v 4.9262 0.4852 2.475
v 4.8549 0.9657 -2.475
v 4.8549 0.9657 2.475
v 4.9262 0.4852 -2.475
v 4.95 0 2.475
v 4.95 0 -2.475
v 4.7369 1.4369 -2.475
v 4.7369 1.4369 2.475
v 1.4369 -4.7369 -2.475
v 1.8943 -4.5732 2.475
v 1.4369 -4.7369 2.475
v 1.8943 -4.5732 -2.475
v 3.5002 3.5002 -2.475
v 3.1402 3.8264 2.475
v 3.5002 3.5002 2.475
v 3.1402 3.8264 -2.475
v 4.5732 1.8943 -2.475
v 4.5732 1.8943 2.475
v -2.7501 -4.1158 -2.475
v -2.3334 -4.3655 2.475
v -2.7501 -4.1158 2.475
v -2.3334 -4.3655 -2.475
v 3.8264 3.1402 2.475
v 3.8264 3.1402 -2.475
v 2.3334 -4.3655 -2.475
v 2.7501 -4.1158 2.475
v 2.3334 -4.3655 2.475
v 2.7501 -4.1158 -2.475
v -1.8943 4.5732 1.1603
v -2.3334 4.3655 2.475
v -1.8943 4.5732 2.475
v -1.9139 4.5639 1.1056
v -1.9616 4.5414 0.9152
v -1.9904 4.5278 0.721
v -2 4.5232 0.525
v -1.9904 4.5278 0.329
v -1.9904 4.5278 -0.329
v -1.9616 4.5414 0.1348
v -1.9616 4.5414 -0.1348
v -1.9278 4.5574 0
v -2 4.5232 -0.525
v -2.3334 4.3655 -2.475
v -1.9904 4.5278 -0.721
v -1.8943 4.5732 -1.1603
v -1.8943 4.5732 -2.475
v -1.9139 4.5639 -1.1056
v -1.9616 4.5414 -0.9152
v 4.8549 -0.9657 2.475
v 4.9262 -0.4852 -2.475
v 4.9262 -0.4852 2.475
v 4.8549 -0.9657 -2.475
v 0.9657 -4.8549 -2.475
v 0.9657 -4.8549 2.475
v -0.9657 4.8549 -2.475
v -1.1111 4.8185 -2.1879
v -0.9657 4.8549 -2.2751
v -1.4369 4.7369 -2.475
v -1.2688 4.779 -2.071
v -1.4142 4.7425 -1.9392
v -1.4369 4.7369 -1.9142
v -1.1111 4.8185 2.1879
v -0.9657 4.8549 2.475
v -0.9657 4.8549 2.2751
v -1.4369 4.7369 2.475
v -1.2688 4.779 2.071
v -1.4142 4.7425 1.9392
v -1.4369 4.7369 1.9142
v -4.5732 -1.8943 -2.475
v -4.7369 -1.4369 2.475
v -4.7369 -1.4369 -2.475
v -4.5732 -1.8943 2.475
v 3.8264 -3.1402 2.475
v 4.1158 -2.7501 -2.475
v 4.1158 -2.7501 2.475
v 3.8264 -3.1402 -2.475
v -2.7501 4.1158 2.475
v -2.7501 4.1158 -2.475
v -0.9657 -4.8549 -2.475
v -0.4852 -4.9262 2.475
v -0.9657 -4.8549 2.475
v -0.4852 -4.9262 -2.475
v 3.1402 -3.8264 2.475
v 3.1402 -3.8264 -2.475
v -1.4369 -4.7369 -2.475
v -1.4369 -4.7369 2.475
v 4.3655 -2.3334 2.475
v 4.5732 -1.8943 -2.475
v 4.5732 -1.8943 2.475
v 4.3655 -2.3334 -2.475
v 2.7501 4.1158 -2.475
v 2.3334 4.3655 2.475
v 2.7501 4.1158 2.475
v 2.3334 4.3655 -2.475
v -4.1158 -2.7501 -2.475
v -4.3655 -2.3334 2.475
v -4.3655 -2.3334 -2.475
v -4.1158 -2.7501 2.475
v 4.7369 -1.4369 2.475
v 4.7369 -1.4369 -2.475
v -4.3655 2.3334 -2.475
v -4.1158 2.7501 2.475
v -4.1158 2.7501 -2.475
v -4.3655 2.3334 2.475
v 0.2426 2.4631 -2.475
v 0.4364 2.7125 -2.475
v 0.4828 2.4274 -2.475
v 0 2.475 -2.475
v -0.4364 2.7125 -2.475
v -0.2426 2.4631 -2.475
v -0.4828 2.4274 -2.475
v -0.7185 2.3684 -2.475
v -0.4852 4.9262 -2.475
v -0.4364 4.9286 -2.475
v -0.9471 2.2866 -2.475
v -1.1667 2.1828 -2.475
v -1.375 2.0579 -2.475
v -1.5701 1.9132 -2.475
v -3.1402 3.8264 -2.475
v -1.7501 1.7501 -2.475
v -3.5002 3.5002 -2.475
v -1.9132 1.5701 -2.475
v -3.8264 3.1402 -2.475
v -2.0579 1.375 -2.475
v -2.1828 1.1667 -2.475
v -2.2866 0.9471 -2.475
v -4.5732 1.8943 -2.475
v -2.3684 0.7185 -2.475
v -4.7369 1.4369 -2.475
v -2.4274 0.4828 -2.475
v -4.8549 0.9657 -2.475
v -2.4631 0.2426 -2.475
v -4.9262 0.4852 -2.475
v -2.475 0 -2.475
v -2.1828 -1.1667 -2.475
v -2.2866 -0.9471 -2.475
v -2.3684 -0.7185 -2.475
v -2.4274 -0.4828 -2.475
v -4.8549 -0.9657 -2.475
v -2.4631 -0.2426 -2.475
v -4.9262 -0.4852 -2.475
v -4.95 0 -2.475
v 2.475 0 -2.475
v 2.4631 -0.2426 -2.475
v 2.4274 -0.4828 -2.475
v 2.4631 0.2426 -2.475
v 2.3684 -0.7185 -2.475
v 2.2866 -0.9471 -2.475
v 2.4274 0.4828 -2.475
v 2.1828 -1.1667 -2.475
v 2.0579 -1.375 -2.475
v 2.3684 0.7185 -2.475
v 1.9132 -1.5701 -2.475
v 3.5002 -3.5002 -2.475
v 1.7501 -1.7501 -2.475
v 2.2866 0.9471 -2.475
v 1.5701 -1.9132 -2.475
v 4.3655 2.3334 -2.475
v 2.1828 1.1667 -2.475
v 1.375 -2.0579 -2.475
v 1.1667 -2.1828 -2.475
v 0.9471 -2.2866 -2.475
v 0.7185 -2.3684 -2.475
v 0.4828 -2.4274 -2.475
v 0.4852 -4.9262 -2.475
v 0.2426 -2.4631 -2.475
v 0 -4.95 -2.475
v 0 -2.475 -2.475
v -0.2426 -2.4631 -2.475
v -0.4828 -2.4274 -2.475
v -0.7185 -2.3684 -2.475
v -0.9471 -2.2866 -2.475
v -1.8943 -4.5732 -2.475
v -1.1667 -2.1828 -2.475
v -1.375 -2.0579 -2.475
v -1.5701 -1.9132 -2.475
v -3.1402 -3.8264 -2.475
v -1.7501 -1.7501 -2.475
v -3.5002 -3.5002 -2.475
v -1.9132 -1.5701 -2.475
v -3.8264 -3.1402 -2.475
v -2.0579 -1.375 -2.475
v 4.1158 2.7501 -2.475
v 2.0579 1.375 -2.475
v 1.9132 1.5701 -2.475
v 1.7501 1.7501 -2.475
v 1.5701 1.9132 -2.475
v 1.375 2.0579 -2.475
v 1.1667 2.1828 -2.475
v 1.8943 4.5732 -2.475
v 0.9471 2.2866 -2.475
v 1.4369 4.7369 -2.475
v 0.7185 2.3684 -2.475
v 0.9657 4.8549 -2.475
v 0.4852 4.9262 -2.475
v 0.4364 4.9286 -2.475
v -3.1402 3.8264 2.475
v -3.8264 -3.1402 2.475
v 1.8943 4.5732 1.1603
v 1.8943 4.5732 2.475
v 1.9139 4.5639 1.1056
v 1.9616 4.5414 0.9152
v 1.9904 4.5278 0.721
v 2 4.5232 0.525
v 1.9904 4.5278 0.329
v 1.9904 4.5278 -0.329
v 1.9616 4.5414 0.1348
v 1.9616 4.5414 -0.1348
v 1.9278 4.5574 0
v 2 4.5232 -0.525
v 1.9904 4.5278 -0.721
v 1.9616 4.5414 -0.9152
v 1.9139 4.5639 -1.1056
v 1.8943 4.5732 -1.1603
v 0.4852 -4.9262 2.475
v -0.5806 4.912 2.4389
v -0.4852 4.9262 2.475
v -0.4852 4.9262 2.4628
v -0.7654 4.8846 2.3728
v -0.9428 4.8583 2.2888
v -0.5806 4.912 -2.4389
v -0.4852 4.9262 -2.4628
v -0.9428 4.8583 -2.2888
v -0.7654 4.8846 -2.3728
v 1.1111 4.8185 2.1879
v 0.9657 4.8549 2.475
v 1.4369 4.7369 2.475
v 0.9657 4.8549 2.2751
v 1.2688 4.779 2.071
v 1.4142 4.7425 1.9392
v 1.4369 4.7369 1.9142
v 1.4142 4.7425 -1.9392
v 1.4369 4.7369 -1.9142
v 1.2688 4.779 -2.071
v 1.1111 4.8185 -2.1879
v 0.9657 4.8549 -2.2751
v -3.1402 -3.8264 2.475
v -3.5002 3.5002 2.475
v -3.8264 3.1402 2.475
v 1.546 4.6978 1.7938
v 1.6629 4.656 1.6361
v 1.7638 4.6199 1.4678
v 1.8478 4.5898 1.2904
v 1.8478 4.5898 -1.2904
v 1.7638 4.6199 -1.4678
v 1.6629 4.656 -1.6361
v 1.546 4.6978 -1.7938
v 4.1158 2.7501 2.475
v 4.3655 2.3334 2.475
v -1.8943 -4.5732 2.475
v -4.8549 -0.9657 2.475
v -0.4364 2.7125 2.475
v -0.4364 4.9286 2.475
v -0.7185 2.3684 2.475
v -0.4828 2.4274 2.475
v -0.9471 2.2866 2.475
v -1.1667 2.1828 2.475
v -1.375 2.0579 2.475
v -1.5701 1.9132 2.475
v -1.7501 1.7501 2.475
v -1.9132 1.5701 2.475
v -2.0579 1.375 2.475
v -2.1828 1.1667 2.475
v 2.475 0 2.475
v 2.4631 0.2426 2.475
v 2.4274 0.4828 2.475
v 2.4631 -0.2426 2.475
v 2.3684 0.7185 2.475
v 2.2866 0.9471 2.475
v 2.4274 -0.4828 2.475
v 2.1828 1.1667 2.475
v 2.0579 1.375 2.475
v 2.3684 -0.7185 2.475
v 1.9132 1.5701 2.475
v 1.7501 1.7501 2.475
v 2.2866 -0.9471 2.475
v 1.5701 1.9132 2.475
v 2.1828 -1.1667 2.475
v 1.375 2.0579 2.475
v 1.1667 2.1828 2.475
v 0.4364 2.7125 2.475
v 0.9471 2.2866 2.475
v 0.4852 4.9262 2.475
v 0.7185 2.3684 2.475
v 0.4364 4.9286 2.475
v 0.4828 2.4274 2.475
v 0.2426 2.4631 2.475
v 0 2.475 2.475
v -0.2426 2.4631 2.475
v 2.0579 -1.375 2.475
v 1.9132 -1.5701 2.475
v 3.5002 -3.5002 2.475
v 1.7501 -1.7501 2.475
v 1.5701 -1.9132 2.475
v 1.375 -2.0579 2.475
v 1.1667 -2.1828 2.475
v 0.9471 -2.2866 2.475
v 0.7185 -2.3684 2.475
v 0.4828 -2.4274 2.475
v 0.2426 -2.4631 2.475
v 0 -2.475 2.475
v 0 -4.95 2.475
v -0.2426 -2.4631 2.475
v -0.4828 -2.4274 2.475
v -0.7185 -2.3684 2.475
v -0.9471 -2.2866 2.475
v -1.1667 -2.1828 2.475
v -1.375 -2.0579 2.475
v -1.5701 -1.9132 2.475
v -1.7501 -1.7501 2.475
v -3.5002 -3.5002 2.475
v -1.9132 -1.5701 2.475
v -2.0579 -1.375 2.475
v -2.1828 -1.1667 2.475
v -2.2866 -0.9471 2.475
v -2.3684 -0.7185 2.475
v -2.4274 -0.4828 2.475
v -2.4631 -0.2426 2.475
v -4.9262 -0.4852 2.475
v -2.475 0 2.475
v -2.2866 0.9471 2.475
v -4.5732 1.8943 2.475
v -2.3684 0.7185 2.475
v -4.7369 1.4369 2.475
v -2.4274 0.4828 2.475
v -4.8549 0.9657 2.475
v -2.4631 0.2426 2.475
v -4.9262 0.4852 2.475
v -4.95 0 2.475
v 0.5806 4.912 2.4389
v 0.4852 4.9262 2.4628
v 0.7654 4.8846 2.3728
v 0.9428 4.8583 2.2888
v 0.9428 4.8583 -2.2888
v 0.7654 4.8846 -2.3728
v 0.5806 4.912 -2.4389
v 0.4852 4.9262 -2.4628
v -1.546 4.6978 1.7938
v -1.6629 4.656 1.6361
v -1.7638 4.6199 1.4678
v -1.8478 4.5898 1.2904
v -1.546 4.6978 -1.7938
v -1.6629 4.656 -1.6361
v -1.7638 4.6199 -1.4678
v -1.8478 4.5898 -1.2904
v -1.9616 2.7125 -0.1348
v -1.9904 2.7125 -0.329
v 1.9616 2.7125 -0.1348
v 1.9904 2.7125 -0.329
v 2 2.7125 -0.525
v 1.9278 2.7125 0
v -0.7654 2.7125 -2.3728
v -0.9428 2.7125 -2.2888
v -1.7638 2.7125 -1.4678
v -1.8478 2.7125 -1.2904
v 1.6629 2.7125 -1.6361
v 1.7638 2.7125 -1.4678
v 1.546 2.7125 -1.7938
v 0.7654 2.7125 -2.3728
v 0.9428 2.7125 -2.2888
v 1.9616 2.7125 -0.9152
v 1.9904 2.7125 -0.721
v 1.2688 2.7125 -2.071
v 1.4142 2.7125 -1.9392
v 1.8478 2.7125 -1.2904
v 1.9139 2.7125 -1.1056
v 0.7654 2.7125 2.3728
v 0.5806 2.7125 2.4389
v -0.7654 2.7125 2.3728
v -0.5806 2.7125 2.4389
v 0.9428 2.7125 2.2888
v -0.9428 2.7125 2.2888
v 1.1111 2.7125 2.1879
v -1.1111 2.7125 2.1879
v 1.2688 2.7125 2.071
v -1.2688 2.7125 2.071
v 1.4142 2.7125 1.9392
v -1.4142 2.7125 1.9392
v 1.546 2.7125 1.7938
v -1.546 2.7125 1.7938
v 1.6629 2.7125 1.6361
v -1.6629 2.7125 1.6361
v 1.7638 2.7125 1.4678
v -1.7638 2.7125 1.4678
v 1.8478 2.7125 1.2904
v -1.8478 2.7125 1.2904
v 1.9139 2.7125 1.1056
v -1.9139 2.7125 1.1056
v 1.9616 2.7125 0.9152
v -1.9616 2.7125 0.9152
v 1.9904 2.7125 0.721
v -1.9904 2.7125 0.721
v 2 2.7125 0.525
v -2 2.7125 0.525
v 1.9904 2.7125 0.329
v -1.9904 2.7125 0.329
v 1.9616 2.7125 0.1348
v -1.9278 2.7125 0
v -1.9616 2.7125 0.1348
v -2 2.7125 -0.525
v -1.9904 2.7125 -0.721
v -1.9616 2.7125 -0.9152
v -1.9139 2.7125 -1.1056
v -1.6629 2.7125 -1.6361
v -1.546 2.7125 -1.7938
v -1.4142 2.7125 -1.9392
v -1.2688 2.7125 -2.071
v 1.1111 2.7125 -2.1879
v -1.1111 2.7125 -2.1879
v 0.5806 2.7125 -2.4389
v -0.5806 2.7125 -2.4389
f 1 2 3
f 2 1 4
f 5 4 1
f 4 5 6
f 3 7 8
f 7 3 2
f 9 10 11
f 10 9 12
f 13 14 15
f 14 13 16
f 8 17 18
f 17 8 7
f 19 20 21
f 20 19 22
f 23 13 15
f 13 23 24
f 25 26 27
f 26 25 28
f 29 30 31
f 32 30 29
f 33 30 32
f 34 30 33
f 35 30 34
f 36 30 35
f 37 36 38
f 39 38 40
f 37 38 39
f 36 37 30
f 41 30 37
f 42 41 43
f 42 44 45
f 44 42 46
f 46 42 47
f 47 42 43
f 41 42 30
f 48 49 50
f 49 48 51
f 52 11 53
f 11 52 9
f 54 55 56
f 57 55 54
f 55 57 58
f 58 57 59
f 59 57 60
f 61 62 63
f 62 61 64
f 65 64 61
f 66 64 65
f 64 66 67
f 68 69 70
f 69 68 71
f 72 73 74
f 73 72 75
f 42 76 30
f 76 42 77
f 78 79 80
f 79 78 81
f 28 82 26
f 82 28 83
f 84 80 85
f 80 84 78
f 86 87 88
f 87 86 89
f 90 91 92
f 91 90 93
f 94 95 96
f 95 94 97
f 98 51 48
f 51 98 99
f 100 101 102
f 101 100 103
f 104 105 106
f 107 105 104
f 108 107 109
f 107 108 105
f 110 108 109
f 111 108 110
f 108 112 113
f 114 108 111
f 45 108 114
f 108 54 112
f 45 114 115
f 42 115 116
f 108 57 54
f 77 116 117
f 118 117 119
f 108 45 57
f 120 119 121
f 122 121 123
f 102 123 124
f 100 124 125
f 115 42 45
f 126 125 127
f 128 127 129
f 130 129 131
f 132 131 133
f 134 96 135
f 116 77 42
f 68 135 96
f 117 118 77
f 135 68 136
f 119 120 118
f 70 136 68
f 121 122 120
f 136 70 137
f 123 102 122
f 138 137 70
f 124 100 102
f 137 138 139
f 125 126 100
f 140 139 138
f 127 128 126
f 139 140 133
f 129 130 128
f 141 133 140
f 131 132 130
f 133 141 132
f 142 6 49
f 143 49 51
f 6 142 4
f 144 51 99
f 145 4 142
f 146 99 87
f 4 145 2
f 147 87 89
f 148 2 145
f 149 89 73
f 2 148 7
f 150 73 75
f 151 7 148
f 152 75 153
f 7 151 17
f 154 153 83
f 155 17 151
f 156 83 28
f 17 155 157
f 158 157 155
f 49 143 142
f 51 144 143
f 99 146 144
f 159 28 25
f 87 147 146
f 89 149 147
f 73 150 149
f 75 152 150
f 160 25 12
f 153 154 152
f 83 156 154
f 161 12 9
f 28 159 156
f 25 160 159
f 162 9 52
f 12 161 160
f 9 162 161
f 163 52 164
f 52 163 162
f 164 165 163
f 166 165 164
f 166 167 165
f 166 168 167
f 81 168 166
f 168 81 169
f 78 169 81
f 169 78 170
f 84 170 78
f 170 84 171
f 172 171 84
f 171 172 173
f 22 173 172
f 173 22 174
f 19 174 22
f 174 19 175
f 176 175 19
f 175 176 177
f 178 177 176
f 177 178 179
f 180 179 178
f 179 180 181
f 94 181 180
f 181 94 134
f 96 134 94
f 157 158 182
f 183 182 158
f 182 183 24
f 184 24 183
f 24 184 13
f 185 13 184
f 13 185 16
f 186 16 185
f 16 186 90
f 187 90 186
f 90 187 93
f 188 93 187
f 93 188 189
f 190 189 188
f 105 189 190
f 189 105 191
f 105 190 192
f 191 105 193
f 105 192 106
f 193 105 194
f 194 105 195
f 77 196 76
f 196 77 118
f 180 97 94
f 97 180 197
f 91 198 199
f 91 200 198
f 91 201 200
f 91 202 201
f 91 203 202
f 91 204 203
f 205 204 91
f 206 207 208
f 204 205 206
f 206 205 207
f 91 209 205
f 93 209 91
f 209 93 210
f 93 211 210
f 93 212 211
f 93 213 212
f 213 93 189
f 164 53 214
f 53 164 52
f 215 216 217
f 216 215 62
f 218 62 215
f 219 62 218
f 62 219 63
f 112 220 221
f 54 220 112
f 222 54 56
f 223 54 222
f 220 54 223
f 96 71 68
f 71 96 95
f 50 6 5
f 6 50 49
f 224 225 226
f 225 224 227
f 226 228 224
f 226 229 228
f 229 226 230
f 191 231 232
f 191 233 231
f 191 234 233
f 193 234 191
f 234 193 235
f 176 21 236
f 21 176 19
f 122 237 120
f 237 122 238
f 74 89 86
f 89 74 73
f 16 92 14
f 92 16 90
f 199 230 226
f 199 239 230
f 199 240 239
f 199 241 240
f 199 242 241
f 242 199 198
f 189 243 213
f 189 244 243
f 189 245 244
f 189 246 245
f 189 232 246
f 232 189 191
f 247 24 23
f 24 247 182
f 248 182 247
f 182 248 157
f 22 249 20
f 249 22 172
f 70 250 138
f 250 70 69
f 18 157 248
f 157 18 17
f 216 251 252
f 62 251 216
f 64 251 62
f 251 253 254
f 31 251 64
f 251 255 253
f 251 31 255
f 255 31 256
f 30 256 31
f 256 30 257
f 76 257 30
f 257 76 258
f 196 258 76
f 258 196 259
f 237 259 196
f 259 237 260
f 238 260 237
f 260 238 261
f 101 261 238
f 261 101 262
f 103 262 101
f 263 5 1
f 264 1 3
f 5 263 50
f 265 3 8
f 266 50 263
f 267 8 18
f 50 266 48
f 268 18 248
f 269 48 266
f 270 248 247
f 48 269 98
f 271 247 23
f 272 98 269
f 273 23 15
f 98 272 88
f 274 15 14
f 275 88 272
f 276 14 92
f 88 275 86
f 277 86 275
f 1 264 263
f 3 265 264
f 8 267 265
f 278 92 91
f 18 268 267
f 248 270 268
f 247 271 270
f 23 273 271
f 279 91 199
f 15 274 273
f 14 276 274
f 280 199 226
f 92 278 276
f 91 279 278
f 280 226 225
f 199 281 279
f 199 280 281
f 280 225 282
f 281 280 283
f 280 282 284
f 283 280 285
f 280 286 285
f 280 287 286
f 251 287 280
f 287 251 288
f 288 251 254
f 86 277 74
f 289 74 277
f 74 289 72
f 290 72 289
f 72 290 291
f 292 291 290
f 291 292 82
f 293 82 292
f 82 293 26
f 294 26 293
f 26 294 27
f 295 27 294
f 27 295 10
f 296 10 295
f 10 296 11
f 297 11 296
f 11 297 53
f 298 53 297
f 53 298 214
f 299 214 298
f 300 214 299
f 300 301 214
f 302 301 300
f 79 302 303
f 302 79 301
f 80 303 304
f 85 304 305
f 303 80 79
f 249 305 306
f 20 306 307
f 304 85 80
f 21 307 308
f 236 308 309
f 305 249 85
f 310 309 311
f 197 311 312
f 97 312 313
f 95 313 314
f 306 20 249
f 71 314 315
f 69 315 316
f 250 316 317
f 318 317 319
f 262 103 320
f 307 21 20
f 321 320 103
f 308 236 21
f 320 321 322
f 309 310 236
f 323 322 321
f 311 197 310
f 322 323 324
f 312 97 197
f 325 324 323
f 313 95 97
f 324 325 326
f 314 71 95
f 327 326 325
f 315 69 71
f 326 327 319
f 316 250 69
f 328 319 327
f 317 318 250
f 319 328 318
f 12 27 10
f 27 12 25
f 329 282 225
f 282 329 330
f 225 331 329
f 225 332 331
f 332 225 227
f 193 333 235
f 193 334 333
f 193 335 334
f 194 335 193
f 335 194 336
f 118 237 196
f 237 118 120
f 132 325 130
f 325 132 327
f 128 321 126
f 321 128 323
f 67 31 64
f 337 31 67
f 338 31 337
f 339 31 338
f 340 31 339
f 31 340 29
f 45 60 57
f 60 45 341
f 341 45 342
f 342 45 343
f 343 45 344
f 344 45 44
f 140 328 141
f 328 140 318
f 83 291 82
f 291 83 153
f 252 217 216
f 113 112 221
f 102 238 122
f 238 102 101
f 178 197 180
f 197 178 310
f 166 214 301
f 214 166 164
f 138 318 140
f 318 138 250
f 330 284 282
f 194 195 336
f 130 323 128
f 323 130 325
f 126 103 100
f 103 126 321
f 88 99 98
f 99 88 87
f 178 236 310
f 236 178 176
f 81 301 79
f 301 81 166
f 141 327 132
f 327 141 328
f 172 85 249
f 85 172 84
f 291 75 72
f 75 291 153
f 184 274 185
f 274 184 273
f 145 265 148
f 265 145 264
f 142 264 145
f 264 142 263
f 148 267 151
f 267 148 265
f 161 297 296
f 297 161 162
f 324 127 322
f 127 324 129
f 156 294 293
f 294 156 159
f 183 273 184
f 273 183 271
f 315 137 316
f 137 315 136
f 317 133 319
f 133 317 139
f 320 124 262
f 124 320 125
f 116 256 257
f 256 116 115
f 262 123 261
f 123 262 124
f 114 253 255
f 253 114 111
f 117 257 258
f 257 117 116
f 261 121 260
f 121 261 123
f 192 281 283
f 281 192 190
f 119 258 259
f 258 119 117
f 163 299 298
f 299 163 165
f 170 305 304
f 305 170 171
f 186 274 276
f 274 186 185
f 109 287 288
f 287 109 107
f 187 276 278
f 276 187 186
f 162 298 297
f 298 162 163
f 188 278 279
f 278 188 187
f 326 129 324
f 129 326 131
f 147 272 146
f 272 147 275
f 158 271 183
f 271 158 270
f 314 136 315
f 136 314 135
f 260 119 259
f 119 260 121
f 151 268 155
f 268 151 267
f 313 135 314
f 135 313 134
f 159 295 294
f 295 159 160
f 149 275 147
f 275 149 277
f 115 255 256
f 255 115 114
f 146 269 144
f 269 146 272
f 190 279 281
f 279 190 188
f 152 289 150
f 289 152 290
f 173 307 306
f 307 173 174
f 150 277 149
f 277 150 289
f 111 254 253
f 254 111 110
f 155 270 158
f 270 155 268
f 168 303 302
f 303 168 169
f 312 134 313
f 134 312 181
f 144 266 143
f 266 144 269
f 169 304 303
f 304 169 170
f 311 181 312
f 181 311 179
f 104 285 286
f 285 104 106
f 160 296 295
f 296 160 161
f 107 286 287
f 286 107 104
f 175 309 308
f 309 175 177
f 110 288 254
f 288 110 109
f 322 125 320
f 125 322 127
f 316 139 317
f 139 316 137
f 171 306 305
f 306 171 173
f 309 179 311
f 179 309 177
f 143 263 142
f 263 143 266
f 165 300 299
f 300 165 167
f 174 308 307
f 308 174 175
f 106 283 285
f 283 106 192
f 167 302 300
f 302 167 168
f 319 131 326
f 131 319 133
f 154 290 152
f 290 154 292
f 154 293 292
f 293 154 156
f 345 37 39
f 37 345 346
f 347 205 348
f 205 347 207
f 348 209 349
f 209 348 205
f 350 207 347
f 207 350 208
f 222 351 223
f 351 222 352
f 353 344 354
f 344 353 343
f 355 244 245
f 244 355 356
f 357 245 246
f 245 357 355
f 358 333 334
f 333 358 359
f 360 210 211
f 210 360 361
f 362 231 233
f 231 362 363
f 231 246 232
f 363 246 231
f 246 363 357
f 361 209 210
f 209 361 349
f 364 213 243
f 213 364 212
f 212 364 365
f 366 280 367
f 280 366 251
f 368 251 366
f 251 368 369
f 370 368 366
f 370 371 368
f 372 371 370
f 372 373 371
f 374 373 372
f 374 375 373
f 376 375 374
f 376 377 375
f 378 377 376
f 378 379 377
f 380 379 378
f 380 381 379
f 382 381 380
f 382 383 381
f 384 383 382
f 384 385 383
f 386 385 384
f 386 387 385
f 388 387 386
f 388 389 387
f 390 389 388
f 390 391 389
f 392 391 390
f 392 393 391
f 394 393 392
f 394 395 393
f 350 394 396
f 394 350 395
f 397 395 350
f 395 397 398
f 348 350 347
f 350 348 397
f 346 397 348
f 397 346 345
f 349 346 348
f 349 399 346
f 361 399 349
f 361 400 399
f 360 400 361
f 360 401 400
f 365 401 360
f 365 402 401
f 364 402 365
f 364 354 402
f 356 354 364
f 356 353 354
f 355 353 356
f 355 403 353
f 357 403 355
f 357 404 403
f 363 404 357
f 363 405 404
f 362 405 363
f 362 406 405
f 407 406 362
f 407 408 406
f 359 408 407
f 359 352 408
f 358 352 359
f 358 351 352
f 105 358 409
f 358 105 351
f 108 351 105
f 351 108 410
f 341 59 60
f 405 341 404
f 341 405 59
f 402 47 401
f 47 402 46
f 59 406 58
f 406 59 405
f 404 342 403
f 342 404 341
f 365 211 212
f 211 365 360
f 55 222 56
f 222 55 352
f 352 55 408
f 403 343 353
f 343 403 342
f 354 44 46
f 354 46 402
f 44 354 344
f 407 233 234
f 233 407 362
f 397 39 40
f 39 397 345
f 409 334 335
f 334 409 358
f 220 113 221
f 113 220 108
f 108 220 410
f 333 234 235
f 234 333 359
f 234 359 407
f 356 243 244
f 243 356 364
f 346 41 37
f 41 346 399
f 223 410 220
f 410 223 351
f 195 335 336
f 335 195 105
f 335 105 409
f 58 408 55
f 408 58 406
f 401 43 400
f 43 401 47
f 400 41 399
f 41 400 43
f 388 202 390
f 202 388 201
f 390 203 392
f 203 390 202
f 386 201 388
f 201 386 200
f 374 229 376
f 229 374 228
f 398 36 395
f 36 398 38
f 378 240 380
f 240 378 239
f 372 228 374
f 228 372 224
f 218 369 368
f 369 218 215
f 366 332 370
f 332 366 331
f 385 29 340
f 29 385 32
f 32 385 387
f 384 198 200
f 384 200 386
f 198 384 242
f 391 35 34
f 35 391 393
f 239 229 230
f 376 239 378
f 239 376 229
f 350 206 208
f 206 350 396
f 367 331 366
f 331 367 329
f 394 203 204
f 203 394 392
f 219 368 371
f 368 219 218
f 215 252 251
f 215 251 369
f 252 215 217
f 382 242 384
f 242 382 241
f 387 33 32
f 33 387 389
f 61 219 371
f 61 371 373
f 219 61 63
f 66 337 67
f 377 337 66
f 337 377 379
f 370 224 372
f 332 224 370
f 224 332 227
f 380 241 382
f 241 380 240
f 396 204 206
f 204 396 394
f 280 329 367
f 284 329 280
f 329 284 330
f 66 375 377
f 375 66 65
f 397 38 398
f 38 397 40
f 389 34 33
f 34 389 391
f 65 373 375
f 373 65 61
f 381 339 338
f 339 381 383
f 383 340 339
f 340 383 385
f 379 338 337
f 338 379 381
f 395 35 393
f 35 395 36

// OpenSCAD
// COBRA Vertebra - C7 V6
// Height: 4.95mm, OD: 9.9mm

$fn = 64;

difference() {
    // Outer cylinder
    cylinder(h=4.95, d=9.9, center=true);
    
    // Inner channel
    cylinder(h=6.95, d=4.95, center=true);

    // Pivot holes
    translate([0, 4.95, -0.5249999999999999])
    rotate([90, 0, 0])
    cylinder(h=4.475, d=4, center=true);
    
    translate([0, 4.95, 0.5249999999999999])
    rotate([90, 0, 0])
    cylinder(h=4.475, d=4, center=true);
}
